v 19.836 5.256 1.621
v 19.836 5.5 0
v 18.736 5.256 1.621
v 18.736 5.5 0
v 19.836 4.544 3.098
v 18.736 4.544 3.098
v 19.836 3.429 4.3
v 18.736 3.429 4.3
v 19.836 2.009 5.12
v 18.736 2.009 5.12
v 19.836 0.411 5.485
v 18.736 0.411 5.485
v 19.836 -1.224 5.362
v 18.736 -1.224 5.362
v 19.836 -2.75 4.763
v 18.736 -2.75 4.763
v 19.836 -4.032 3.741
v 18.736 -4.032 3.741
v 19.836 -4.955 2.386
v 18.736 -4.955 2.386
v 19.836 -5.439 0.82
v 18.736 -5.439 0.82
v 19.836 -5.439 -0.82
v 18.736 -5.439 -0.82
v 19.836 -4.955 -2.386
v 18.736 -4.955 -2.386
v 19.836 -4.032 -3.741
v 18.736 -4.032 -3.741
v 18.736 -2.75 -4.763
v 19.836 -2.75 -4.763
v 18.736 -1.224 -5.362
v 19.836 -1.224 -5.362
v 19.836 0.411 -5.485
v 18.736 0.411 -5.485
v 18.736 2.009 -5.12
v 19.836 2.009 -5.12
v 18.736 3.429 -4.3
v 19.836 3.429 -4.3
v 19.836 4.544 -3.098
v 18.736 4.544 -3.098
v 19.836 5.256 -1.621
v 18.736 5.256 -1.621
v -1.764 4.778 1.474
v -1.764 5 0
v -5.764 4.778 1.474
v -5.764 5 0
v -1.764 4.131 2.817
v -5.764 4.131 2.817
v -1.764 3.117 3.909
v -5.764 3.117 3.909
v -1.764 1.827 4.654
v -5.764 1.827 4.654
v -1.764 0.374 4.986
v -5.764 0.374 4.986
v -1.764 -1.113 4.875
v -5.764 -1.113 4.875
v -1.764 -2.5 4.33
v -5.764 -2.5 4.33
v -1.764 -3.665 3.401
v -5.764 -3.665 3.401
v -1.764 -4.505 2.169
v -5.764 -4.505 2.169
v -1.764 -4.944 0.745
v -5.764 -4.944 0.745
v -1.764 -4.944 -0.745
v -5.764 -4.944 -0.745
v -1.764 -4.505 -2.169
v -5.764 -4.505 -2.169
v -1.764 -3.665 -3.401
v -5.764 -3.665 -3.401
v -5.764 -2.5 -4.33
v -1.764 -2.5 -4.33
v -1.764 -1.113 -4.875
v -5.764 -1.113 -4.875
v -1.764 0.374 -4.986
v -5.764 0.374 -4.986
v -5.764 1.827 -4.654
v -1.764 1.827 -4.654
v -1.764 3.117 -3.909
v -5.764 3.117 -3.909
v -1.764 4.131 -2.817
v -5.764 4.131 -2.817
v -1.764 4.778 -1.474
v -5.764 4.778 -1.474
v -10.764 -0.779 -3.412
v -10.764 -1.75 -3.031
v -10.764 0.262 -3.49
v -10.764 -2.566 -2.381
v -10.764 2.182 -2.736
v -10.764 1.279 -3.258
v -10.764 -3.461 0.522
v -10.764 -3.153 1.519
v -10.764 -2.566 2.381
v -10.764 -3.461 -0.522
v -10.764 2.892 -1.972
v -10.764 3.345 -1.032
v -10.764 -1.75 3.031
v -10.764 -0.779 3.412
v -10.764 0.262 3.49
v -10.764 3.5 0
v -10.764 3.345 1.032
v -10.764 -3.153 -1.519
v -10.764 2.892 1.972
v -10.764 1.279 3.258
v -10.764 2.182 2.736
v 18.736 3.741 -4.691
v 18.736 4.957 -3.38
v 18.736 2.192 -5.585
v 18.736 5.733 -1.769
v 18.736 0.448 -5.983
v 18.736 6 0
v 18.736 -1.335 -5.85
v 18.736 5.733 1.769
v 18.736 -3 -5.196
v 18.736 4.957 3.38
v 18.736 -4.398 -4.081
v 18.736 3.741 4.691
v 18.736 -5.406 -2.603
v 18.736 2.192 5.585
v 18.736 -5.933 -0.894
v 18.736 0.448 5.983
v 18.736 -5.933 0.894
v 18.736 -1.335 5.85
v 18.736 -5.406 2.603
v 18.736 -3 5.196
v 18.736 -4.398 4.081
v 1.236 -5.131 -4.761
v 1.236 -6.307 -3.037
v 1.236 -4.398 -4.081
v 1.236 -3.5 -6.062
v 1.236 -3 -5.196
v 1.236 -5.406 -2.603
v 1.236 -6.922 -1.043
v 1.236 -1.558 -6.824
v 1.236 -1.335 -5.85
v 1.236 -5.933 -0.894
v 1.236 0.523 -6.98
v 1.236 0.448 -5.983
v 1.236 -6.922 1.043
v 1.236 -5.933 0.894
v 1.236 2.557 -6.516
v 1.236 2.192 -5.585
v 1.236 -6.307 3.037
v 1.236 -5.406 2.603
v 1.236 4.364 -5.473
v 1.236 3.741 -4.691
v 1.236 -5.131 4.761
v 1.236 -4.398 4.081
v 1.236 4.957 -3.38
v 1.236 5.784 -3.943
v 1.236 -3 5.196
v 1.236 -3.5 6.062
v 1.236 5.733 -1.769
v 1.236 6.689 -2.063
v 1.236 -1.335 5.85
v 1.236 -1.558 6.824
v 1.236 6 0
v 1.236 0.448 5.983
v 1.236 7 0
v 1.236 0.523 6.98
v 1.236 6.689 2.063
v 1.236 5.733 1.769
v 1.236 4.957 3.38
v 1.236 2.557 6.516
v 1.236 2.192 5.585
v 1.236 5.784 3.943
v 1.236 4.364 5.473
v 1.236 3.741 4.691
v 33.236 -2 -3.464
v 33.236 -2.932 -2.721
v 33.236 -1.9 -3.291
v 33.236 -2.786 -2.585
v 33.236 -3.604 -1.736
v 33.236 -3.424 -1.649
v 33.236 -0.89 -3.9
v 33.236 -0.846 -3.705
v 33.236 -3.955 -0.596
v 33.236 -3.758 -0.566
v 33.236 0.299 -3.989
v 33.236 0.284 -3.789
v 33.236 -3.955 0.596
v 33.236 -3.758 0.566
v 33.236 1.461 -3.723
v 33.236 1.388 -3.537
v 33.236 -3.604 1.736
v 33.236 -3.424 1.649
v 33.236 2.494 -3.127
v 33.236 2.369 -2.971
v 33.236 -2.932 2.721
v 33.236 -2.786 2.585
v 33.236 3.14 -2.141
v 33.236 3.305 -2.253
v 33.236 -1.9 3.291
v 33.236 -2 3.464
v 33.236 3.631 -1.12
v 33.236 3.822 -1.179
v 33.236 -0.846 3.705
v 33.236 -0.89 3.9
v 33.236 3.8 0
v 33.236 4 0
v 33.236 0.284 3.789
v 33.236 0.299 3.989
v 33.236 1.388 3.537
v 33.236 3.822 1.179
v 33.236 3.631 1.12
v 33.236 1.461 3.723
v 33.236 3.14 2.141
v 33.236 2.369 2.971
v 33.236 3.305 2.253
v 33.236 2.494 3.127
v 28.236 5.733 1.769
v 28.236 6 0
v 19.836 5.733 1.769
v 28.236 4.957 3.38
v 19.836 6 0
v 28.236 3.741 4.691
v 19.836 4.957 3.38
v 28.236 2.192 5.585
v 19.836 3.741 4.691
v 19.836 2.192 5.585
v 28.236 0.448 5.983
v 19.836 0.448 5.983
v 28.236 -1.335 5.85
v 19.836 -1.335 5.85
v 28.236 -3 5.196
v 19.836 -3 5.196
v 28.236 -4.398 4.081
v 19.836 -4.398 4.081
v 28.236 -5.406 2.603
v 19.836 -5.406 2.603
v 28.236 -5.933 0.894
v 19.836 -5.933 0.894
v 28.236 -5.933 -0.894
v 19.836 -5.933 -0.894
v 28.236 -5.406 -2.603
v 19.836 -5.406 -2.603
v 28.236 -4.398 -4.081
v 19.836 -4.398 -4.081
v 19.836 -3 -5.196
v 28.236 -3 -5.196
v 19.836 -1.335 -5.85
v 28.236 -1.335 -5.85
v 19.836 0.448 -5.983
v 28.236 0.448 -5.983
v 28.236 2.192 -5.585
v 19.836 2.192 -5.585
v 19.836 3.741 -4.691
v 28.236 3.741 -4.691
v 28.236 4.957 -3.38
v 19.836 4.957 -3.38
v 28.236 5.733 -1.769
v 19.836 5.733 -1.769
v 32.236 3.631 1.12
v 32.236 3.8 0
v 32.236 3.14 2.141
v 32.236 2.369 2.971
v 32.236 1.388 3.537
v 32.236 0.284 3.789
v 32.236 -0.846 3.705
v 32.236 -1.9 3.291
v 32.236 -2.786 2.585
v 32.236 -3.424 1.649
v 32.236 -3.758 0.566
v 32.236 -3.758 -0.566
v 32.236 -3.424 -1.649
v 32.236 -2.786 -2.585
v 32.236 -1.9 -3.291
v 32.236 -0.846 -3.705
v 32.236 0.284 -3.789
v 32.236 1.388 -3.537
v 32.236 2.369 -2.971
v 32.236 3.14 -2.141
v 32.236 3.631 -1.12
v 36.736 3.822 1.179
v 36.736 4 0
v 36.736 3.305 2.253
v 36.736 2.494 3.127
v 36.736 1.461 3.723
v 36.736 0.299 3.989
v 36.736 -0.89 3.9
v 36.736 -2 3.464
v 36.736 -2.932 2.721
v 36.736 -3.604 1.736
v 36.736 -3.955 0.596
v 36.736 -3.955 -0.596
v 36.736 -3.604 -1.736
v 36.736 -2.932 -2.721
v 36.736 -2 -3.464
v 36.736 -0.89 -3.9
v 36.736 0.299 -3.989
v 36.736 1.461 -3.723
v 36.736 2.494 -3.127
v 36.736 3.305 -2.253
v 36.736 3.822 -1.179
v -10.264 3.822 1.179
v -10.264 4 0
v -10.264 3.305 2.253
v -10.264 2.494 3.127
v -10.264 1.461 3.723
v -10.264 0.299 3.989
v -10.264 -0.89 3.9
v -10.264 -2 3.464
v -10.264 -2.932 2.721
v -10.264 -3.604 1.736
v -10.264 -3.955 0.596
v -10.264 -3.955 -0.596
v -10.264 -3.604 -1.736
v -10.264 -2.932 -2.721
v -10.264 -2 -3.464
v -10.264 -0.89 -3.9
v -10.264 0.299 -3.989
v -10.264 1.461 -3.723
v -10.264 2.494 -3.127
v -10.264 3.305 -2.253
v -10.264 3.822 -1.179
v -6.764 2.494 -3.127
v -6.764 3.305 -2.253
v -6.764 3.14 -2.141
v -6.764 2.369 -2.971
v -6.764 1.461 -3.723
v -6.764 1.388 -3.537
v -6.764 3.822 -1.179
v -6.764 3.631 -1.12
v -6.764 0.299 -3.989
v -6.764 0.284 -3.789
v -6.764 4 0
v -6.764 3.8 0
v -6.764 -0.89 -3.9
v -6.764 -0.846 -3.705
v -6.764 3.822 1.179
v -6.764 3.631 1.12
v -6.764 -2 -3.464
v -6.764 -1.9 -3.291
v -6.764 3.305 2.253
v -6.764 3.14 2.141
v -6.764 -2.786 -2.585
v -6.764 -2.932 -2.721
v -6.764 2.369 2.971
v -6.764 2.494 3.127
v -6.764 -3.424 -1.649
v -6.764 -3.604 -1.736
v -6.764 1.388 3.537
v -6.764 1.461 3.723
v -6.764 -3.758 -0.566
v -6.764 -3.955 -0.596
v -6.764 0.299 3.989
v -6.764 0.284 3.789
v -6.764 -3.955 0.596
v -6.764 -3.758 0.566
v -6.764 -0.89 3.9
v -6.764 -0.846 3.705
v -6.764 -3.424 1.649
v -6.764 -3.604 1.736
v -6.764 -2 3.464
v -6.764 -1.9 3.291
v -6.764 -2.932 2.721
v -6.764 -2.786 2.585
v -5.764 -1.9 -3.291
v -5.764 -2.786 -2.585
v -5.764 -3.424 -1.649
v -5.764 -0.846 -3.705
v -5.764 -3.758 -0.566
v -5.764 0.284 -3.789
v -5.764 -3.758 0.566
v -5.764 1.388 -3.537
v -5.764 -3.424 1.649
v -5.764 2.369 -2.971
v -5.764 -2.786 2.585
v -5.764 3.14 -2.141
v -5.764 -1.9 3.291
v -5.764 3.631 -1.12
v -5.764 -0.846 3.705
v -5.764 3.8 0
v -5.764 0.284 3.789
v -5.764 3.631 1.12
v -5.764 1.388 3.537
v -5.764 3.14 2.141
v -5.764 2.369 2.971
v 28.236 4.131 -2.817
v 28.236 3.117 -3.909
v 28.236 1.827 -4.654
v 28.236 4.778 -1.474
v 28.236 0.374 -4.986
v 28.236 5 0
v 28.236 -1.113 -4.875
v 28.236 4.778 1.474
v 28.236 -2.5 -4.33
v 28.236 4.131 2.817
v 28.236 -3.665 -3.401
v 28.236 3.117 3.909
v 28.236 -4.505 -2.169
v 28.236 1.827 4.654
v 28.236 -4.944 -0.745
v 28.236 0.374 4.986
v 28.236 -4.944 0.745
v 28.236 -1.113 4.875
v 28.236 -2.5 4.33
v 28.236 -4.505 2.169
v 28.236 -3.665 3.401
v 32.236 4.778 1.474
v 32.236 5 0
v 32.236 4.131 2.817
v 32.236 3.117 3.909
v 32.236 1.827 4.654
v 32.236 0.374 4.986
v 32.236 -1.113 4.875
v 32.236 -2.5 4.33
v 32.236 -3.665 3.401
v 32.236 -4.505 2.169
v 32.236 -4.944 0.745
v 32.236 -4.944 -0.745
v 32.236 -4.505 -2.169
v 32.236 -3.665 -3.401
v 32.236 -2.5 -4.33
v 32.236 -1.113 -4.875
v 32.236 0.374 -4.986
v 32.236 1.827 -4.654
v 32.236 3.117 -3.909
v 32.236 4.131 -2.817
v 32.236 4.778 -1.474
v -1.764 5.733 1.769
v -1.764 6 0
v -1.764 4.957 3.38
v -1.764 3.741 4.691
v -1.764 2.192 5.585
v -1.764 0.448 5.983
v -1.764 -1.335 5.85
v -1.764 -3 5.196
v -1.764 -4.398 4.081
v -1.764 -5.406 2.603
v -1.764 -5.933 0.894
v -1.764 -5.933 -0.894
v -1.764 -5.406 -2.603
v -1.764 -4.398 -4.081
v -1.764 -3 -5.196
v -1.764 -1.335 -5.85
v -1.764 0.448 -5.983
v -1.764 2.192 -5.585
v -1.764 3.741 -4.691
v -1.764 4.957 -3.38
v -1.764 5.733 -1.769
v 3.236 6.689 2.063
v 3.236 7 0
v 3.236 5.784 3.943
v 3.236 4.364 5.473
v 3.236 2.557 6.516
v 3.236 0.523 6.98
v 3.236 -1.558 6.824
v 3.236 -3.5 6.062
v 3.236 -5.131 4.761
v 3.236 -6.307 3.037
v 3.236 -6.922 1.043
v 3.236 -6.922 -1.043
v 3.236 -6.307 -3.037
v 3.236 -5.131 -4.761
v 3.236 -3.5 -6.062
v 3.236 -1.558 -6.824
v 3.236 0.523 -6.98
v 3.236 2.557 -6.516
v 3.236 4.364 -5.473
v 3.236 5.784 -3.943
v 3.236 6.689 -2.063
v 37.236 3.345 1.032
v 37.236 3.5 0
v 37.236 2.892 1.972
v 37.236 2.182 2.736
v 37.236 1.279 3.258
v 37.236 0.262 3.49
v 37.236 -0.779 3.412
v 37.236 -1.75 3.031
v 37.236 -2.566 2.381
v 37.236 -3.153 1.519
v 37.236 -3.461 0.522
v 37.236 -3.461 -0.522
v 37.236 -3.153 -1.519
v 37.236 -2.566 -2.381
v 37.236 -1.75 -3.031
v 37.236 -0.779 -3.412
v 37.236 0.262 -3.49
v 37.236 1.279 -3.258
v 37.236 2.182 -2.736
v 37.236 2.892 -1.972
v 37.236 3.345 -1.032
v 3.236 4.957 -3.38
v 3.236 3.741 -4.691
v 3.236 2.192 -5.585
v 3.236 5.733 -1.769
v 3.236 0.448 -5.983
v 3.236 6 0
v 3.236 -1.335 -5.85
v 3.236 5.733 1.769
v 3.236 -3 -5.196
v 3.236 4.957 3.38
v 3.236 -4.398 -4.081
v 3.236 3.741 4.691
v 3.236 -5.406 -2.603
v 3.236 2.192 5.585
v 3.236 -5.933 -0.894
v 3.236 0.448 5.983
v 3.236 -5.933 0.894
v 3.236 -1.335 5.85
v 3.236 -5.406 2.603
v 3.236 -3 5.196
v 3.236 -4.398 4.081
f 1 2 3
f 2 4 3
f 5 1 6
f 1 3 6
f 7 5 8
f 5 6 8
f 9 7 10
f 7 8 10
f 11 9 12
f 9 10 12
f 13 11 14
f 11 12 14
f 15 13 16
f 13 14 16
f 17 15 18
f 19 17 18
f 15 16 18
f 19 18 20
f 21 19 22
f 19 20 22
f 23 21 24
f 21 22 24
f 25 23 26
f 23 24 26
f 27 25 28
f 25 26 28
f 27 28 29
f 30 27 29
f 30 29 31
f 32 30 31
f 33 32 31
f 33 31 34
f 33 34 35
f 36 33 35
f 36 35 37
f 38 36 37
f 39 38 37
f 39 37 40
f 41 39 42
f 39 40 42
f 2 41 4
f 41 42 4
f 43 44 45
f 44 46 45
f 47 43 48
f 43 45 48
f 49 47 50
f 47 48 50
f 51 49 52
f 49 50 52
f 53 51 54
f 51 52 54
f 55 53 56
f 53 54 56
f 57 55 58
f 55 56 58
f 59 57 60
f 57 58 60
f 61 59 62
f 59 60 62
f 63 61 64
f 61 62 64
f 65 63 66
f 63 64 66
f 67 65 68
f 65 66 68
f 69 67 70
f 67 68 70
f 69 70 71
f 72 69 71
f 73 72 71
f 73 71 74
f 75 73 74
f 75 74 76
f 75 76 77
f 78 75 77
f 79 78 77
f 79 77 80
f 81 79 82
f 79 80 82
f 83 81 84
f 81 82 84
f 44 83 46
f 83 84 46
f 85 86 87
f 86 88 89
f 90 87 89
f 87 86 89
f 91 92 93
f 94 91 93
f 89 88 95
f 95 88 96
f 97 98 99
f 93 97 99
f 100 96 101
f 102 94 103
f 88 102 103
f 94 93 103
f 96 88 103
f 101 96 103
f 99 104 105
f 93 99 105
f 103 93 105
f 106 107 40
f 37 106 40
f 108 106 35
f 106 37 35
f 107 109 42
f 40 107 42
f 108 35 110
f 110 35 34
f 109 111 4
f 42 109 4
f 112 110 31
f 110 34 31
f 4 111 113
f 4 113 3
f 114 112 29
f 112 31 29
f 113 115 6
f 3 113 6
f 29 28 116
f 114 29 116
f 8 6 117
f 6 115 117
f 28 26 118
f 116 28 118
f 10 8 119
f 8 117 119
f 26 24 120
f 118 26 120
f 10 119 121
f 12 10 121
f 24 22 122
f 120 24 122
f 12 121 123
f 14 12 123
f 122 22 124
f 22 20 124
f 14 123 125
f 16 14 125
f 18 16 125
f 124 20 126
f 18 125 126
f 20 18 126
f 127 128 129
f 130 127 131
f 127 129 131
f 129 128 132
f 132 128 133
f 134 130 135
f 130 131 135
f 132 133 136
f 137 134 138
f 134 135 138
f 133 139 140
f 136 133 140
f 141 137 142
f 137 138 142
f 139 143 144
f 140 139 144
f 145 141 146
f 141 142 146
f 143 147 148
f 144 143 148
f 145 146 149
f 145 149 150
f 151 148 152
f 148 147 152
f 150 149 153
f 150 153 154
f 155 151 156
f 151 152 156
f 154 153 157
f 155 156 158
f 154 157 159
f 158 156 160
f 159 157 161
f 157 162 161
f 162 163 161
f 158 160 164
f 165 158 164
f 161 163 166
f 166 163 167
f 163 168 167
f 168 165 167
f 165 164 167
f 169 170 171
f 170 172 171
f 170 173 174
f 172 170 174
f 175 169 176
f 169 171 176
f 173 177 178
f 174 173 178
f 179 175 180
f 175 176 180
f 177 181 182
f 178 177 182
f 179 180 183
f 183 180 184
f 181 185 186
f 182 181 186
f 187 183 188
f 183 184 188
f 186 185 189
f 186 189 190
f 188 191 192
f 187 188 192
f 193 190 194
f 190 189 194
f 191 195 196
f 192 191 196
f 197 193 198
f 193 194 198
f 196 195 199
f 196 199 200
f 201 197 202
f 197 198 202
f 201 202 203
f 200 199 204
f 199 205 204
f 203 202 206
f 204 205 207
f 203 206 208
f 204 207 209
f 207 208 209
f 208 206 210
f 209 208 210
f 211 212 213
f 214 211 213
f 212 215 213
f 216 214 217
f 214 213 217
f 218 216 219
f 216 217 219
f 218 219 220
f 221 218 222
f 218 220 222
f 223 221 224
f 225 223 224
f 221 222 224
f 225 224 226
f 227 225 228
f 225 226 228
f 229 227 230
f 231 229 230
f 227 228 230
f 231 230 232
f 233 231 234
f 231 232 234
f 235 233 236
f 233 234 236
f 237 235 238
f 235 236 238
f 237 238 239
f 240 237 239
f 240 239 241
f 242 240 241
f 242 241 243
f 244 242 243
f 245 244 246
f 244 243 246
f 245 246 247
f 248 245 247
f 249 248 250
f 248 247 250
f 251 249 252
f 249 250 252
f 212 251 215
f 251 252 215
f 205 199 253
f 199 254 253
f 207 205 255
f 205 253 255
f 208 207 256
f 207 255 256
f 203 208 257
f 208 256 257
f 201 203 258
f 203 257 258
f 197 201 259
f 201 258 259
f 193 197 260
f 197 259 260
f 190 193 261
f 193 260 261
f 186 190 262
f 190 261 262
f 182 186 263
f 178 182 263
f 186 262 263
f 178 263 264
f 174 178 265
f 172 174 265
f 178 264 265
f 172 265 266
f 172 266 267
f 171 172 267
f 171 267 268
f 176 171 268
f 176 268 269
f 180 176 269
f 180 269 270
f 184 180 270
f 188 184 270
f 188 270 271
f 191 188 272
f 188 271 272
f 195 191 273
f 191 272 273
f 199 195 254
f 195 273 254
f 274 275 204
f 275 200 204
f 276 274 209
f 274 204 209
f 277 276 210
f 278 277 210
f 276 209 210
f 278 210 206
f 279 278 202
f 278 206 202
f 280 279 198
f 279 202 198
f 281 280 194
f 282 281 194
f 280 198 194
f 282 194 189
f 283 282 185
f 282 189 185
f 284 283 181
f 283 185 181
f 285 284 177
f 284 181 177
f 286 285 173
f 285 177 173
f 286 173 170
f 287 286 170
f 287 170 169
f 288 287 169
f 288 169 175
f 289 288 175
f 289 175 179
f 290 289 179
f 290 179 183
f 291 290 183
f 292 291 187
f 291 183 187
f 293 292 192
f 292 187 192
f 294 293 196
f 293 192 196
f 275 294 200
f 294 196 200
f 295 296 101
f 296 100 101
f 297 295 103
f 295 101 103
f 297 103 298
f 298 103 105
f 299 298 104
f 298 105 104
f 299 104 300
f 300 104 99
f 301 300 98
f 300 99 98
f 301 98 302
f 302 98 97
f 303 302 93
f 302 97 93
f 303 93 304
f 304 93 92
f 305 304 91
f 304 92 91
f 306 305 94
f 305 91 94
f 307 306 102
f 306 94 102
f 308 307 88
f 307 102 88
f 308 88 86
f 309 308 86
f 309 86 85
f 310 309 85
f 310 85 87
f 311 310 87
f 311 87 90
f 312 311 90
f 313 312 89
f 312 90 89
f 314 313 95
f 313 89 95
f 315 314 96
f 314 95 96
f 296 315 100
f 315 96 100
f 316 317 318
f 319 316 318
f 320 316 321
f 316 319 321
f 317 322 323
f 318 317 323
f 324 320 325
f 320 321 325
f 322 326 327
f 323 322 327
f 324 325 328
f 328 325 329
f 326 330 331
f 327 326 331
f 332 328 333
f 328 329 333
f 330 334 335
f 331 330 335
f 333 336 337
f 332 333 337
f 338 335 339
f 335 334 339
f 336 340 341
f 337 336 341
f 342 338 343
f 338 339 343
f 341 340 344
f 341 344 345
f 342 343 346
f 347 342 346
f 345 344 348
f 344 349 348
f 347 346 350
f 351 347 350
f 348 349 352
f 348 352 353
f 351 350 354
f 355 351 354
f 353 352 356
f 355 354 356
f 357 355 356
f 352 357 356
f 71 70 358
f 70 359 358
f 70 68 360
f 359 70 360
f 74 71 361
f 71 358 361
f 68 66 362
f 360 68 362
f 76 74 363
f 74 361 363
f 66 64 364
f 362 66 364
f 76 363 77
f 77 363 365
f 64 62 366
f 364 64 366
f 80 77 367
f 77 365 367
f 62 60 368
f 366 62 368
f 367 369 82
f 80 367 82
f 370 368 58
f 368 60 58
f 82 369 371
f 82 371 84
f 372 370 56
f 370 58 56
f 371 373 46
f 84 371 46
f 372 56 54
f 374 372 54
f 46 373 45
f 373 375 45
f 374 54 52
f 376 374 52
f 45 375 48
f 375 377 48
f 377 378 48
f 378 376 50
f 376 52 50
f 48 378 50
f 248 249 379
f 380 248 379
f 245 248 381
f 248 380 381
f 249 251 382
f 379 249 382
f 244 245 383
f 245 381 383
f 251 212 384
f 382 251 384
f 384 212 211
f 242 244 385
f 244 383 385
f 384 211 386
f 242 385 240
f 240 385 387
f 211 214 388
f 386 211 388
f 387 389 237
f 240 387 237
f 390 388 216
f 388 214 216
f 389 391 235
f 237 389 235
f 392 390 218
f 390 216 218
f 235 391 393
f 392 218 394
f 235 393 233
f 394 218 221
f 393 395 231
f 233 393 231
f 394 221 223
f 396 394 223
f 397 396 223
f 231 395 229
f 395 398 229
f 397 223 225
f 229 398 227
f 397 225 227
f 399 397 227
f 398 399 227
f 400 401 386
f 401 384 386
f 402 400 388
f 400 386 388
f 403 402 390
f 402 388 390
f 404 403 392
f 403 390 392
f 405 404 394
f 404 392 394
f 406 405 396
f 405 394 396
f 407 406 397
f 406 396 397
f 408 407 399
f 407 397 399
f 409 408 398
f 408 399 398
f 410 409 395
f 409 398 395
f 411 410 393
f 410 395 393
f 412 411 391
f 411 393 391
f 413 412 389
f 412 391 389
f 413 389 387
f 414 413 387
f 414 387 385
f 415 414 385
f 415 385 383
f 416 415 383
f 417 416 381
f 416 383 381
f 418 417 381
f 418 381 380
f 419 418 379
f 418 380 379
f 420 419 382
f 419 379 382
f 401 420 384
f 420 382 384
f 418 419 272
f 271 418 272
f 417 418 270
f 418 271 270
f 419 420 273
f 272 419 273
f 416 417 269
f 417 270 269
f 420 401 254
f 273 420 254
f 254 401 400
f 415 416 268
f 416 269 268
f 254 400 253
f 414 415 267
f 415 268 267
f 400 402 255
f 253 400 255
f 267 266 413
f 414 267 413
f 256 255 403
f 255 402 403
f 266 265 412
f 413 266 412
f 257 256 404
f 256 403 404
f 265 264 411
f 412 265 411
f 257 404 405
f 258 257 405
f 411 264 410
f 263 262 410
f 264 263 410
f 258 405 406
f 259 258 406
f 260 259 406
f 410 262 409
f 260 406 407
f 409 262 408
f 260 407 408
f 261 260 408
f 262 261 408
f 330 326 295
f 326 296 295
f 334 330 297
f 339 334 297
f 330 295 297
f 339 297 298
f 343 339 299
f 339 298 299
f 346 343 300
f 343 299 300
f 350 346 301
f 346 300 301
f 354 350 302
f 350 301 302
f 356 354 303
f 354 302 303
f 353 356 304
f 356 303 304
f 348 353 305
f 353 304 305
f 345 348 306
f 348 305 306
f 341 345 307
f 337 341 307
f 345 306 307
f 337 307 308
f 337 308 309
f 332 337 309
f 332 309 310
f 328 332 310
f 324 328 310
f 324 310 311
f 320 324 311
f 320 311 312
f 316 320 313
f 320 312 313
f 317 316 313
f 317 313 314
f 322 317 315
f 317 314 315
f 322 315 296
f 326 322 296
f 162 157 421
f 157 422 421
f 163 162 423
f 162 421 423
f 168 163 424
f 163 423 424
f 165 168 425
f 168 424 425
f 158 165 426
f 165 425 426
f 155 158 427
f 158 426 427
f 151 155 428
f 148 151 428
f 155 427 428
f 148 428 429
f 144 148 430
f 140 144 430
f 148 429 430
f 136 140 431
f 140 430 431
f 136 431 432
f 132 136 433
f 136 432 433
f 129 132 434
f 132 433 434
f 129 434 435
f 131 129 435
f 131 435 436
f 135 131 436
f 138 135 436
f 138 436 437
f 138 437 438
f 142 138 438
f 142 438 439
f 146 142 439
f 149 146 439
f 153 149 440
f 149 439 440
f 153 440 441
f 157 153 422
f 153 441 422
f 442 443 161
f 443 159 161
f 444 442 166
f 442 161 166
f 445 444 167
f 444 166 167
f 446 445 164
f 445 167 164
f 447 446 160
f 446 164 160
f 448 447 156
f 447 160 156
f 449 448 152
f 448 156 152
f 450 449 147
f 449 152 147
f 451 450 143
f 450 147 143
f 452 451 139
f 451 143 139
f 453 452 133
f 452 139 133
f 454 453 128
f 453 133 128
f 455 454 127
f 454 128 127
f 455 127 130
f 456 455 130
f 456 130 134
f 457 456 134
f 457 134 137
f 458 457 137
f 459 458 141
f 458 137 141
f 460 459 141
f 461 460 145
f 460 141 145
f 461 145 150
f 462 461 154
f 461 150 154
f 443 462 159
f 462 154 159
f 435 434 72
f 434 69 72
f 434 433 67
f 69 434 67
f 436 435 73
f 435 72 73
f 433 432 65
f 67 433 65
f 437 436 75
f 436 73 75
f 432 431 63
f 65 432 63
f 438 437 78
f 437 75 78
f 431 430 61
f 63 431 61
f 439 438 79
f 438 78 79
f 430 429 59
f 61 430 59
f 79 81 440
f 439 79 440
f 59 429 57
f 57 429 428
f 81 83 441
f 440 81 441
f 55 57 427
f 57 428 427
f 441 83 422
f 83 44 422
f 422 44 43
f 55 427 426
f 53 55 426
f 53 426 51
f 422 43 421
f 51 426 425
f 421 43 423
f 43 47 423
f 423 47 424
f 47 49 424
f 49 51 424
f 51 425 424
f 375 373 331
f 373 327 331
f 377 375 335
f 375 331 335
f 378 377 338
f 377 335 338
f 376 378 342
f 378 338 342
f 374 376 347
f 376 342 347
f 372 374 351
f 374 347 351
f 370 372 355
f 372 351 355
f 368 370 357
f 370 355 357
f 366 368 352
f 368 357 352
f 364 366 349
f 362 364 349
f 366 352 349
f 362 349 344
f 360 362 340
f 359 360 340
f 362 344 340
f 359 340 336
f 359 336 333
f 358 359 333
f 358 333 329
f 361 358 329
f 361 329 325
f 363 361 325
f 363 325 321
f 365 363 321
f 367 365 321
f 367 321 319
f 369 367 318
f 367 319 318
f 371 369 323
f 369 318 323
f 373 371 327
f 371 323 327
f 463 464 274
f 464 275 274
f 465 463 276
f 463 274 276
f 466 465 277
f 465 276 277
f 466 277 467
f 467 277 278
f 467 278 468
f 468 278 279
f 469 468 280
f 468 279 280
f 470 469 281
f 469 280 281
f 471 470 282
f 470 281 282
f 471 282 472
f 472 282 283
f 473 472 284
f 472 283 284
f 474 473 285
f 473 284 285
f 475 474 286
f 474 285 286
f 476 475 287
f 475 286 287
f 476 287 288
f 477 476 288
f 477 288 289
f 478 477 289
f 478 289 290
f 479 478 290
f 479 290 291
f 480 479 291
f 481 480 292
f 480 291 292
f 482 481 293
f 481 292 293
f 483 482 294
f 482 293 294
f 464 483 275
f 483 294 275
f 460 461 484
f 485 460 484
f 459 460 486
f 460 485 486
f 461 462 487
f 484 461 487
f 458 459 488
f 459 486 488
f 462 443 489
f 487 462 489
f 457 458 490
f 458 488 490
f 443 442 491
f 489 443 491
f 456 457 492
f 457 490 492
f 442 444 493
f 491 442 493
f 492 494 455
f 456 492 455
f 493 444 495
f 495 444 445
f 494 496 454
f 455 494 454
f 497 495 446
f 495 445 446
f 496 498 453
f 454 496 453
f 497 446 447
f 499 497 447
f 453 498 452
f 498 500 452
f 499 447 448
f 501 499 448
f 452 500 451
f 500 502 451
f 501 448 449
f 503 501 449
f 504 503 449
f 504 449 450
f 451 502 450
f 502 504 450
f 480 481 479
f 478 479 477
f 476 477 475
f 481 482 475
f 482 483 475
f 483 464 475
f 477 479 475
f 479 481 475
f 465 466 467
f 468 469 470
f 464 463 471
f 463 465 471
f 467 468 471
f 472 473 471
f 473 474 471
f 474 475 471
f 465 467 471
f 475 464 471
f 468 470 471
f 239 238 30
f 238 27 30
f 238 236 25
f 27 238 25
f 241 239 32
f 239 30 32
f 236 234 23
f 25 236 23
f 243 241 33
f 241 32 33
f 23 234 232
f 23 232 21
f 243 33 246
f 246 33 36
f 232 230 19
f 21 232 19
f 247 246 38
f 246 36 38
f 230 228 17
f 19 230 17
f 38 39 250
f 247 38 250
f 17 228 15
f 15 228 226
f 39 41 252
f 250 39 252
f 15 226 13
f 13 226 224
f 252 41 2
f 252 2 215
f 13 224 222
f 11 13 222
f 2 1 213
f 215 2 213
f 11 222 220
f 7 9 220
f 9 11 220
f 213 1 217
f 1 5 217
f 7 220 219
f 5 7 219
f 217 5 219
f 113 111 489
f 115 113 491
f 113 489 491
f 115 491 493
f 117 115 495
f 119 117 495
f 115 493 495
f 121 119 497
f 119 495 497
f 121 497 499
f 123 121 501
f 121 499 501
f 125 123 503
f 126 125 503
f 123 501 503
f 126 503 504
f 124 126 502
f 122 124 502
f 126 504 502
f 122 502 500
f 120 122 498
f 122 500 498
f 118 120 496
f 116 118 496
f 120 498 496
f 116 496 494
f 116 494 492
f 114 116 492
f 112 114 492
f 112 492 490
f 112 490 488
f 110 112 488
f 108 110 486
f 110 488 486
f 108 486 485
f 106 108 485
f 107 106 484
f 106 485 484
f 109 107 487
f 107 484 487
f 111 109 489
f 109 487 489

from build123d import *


with BuildPart() as part:
    # 草图1 → 旋转1 (revolve)
    with BuildSketch(Plane.XY):
        Polygon((-10.764397906, 0), (37.235602094, 0), (37.235602094, 3.5), (36.735602094, 4), (33.235602094, 4), (33.235602094, 3.8), (32.235602094, 3.8), (32.235602094, 3.95), (32.235602094, 5), (28.235602094, 5), (28.235602094, 6), (19.835602094, 6), (19.835602094, 5.5), (18.735602094, 5.5), (18.735602094, 6), (3.235602094, 6), (3.235602094, 7), (1.235602094, 7), (1.235602094, 6), (-1.764397906, 6), (-1.764397906, 5), (-5.764397906, 5), (-5.764397906, 3.95), (-5.764397906, 3.8), (-6.764397906, 3.8), (-6.764397906, 4), (-10.264397906, 4), (-10.764397906, 3.5), align=None)
    revolve(axis=Axis((-10.764397906, 0, 0), (1, 0, 0)))


solid = part.part
